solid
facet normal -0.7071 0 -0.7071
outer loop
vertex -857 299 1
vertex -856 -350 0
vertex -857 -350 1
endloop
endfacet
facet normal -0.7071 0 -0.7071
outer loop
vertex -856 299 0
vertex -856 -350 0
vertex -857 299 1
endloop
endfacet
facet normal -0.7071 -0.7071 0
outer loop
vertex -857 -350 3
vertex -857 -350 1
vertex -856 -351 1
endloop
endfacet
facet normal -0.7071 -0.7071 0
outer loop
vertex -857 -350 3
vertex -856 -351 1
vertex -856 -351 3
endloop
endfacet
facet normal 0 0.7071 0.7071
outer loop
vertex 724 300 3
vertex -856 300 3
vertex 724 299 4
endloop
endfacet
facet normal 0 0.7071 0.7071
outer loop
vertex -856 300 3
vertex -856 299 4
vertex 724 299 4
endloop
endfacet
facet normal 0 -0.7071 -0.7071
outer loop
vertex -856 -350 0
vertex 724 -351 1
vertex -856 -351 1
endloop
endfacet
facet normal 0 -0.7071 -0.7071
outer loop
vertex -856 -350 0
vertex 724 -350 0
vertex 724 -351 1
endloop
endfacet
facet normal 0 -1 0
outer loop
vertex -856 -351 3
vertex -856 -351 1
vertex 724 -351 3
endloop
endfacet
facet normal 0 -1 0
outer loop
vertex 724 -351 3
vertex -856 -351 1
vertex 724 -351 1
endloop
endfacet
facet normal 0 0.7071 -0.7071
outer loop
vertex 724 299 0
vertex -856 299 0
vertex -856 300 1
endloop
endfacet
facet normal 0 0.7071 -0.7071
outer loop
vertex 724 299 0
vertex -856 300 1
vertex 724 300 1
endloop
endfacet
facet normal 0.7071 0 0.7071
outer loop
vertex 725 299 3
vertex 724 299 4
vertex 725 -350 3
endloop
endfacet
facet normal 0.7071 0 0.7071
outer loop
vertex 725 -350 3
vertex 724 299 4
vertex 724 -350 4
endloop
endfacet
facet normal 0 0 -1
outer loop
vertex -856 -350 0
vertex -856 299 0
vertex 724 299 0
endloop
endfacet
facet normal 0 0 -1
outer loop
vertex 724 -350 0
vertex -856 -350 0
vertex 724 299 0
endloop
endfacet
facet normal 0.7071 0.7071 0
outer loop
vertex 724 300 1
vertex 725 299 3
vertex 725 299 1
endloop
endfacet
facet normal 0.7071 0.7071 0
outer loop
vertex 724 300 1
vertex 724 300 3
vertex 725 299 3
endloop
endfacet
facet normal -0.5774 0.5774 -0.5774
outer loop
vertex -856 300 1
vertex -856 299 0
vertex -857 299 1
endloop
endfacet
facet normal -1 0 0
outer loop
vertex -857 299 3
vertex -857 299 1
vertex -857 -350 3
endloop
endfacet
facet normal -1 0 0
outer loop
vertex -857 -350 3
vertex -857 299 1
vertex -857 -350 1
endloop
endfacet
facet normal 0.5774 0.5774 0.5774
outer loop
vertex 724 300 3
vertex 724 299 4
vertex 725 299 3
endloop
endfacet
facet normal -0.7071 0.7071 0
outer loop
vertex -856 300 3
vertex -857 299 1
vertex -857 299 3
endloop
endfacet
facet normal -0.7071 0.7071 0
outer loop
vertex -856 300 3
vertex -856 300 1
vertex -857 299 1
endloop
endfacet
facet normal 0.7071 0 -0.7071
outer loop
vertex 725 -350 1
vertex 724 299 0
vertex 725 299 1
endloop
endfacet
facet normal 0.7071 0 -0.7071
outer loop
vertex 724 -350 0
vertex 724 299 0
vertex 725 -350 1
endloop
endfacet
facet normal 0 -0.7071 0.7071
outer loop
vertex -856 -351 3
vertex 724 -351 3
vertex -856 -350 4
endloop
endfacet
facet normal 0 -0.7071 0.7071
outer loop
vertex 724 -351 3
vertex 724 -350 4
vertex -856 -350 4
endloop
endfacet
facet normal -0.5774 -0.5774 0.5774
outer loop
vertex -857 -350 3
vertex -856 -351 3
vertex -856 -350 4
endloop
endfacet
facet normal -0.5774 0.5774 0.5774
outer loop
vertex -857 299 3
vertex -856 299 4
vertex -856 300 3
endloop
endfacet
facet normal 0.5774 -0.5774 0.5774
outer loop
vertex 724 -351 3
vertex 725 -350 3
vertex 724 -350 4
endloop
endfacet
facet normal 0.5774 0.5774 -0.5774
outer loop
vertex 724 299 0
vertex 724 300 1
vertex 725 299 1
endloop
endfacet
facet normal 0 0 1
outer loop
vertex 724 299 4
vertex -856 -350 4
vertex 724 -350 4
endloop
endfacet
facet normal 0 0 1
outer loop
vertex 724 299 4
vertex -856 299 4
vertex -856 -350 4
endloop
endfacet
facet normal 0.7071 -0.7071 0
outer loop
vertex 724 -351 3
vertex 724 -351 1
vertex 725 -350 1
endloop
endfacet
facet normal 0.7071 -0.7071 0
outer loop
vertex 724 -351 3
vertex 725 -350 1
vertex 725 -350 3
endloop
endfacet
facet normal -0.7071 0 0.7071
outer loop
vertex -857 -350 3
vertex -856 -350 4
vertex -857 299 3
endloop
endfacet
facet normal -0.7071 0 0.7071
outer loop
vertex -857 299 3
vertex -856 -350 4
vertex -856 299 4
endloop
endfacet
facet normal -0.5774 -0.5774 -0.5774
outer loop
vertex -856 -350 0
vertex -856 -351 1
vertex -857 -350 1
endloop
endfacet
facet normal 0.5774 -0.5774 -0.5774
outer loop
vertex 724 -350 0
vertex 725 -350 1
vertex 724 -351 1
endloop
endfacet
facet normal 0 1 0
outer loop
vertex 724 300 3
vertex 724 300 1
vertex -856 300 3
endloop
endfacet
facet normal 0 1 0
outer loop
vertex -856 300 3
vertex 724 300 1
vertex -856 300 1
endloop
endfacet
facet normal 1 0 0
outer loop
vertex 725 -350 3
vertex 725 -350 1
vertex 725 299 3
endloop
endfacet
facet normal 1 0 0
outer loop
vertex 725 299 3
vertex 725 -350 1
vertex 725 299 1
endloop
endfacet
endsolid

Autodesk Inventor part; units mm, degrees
ref_plane "YZ Plane" through (0, 0, 0) normal (1, 0, 0) x (0, 1, 0)
ref_plane "XZ Plane" through (0, 0, 0) normal (0, 1, 0) x (-1, 0, 0)
ref_plane "XY Plane" through (0, 0, 0) normal (0, 0, 1) x (1, 0, 0)
ref_plane "Work Plane1" through (318, -51, 0) normal (0, 0, 1) x (1, 0, 0)
sketch "Sketch1" plane through (318, -51, 0) normal (0, 0, 1) x (1, 0, 0)
  line L0 (407, 351) -> (-1175, 351) projected
  line L1 (-1175, 351) -> (-1175, -300) projected
  line L2 (-1175, -300) -> (407, -300) projected
  line L3 (407, -300) -> (407, 351) projected
  point P0 (-318, 51)
extrude "Extrusion1" add sketch "Sketch1" along normal blind 4
chamfer "Chamfer1" distance 1 angle 45 12 edges at (725, -25.5, 4) (-66, 300, 4) (725, 300, 2) (-66, 300, 0) (725, -25.5, 0) (725, -351, 2) (-66, -351, 4) (-66, -351, 0) (-857, -351, 2) (-857, -25.5, 0) (-857, -25.5, 4) (-857, 300, 2)
properties material "Glass"
